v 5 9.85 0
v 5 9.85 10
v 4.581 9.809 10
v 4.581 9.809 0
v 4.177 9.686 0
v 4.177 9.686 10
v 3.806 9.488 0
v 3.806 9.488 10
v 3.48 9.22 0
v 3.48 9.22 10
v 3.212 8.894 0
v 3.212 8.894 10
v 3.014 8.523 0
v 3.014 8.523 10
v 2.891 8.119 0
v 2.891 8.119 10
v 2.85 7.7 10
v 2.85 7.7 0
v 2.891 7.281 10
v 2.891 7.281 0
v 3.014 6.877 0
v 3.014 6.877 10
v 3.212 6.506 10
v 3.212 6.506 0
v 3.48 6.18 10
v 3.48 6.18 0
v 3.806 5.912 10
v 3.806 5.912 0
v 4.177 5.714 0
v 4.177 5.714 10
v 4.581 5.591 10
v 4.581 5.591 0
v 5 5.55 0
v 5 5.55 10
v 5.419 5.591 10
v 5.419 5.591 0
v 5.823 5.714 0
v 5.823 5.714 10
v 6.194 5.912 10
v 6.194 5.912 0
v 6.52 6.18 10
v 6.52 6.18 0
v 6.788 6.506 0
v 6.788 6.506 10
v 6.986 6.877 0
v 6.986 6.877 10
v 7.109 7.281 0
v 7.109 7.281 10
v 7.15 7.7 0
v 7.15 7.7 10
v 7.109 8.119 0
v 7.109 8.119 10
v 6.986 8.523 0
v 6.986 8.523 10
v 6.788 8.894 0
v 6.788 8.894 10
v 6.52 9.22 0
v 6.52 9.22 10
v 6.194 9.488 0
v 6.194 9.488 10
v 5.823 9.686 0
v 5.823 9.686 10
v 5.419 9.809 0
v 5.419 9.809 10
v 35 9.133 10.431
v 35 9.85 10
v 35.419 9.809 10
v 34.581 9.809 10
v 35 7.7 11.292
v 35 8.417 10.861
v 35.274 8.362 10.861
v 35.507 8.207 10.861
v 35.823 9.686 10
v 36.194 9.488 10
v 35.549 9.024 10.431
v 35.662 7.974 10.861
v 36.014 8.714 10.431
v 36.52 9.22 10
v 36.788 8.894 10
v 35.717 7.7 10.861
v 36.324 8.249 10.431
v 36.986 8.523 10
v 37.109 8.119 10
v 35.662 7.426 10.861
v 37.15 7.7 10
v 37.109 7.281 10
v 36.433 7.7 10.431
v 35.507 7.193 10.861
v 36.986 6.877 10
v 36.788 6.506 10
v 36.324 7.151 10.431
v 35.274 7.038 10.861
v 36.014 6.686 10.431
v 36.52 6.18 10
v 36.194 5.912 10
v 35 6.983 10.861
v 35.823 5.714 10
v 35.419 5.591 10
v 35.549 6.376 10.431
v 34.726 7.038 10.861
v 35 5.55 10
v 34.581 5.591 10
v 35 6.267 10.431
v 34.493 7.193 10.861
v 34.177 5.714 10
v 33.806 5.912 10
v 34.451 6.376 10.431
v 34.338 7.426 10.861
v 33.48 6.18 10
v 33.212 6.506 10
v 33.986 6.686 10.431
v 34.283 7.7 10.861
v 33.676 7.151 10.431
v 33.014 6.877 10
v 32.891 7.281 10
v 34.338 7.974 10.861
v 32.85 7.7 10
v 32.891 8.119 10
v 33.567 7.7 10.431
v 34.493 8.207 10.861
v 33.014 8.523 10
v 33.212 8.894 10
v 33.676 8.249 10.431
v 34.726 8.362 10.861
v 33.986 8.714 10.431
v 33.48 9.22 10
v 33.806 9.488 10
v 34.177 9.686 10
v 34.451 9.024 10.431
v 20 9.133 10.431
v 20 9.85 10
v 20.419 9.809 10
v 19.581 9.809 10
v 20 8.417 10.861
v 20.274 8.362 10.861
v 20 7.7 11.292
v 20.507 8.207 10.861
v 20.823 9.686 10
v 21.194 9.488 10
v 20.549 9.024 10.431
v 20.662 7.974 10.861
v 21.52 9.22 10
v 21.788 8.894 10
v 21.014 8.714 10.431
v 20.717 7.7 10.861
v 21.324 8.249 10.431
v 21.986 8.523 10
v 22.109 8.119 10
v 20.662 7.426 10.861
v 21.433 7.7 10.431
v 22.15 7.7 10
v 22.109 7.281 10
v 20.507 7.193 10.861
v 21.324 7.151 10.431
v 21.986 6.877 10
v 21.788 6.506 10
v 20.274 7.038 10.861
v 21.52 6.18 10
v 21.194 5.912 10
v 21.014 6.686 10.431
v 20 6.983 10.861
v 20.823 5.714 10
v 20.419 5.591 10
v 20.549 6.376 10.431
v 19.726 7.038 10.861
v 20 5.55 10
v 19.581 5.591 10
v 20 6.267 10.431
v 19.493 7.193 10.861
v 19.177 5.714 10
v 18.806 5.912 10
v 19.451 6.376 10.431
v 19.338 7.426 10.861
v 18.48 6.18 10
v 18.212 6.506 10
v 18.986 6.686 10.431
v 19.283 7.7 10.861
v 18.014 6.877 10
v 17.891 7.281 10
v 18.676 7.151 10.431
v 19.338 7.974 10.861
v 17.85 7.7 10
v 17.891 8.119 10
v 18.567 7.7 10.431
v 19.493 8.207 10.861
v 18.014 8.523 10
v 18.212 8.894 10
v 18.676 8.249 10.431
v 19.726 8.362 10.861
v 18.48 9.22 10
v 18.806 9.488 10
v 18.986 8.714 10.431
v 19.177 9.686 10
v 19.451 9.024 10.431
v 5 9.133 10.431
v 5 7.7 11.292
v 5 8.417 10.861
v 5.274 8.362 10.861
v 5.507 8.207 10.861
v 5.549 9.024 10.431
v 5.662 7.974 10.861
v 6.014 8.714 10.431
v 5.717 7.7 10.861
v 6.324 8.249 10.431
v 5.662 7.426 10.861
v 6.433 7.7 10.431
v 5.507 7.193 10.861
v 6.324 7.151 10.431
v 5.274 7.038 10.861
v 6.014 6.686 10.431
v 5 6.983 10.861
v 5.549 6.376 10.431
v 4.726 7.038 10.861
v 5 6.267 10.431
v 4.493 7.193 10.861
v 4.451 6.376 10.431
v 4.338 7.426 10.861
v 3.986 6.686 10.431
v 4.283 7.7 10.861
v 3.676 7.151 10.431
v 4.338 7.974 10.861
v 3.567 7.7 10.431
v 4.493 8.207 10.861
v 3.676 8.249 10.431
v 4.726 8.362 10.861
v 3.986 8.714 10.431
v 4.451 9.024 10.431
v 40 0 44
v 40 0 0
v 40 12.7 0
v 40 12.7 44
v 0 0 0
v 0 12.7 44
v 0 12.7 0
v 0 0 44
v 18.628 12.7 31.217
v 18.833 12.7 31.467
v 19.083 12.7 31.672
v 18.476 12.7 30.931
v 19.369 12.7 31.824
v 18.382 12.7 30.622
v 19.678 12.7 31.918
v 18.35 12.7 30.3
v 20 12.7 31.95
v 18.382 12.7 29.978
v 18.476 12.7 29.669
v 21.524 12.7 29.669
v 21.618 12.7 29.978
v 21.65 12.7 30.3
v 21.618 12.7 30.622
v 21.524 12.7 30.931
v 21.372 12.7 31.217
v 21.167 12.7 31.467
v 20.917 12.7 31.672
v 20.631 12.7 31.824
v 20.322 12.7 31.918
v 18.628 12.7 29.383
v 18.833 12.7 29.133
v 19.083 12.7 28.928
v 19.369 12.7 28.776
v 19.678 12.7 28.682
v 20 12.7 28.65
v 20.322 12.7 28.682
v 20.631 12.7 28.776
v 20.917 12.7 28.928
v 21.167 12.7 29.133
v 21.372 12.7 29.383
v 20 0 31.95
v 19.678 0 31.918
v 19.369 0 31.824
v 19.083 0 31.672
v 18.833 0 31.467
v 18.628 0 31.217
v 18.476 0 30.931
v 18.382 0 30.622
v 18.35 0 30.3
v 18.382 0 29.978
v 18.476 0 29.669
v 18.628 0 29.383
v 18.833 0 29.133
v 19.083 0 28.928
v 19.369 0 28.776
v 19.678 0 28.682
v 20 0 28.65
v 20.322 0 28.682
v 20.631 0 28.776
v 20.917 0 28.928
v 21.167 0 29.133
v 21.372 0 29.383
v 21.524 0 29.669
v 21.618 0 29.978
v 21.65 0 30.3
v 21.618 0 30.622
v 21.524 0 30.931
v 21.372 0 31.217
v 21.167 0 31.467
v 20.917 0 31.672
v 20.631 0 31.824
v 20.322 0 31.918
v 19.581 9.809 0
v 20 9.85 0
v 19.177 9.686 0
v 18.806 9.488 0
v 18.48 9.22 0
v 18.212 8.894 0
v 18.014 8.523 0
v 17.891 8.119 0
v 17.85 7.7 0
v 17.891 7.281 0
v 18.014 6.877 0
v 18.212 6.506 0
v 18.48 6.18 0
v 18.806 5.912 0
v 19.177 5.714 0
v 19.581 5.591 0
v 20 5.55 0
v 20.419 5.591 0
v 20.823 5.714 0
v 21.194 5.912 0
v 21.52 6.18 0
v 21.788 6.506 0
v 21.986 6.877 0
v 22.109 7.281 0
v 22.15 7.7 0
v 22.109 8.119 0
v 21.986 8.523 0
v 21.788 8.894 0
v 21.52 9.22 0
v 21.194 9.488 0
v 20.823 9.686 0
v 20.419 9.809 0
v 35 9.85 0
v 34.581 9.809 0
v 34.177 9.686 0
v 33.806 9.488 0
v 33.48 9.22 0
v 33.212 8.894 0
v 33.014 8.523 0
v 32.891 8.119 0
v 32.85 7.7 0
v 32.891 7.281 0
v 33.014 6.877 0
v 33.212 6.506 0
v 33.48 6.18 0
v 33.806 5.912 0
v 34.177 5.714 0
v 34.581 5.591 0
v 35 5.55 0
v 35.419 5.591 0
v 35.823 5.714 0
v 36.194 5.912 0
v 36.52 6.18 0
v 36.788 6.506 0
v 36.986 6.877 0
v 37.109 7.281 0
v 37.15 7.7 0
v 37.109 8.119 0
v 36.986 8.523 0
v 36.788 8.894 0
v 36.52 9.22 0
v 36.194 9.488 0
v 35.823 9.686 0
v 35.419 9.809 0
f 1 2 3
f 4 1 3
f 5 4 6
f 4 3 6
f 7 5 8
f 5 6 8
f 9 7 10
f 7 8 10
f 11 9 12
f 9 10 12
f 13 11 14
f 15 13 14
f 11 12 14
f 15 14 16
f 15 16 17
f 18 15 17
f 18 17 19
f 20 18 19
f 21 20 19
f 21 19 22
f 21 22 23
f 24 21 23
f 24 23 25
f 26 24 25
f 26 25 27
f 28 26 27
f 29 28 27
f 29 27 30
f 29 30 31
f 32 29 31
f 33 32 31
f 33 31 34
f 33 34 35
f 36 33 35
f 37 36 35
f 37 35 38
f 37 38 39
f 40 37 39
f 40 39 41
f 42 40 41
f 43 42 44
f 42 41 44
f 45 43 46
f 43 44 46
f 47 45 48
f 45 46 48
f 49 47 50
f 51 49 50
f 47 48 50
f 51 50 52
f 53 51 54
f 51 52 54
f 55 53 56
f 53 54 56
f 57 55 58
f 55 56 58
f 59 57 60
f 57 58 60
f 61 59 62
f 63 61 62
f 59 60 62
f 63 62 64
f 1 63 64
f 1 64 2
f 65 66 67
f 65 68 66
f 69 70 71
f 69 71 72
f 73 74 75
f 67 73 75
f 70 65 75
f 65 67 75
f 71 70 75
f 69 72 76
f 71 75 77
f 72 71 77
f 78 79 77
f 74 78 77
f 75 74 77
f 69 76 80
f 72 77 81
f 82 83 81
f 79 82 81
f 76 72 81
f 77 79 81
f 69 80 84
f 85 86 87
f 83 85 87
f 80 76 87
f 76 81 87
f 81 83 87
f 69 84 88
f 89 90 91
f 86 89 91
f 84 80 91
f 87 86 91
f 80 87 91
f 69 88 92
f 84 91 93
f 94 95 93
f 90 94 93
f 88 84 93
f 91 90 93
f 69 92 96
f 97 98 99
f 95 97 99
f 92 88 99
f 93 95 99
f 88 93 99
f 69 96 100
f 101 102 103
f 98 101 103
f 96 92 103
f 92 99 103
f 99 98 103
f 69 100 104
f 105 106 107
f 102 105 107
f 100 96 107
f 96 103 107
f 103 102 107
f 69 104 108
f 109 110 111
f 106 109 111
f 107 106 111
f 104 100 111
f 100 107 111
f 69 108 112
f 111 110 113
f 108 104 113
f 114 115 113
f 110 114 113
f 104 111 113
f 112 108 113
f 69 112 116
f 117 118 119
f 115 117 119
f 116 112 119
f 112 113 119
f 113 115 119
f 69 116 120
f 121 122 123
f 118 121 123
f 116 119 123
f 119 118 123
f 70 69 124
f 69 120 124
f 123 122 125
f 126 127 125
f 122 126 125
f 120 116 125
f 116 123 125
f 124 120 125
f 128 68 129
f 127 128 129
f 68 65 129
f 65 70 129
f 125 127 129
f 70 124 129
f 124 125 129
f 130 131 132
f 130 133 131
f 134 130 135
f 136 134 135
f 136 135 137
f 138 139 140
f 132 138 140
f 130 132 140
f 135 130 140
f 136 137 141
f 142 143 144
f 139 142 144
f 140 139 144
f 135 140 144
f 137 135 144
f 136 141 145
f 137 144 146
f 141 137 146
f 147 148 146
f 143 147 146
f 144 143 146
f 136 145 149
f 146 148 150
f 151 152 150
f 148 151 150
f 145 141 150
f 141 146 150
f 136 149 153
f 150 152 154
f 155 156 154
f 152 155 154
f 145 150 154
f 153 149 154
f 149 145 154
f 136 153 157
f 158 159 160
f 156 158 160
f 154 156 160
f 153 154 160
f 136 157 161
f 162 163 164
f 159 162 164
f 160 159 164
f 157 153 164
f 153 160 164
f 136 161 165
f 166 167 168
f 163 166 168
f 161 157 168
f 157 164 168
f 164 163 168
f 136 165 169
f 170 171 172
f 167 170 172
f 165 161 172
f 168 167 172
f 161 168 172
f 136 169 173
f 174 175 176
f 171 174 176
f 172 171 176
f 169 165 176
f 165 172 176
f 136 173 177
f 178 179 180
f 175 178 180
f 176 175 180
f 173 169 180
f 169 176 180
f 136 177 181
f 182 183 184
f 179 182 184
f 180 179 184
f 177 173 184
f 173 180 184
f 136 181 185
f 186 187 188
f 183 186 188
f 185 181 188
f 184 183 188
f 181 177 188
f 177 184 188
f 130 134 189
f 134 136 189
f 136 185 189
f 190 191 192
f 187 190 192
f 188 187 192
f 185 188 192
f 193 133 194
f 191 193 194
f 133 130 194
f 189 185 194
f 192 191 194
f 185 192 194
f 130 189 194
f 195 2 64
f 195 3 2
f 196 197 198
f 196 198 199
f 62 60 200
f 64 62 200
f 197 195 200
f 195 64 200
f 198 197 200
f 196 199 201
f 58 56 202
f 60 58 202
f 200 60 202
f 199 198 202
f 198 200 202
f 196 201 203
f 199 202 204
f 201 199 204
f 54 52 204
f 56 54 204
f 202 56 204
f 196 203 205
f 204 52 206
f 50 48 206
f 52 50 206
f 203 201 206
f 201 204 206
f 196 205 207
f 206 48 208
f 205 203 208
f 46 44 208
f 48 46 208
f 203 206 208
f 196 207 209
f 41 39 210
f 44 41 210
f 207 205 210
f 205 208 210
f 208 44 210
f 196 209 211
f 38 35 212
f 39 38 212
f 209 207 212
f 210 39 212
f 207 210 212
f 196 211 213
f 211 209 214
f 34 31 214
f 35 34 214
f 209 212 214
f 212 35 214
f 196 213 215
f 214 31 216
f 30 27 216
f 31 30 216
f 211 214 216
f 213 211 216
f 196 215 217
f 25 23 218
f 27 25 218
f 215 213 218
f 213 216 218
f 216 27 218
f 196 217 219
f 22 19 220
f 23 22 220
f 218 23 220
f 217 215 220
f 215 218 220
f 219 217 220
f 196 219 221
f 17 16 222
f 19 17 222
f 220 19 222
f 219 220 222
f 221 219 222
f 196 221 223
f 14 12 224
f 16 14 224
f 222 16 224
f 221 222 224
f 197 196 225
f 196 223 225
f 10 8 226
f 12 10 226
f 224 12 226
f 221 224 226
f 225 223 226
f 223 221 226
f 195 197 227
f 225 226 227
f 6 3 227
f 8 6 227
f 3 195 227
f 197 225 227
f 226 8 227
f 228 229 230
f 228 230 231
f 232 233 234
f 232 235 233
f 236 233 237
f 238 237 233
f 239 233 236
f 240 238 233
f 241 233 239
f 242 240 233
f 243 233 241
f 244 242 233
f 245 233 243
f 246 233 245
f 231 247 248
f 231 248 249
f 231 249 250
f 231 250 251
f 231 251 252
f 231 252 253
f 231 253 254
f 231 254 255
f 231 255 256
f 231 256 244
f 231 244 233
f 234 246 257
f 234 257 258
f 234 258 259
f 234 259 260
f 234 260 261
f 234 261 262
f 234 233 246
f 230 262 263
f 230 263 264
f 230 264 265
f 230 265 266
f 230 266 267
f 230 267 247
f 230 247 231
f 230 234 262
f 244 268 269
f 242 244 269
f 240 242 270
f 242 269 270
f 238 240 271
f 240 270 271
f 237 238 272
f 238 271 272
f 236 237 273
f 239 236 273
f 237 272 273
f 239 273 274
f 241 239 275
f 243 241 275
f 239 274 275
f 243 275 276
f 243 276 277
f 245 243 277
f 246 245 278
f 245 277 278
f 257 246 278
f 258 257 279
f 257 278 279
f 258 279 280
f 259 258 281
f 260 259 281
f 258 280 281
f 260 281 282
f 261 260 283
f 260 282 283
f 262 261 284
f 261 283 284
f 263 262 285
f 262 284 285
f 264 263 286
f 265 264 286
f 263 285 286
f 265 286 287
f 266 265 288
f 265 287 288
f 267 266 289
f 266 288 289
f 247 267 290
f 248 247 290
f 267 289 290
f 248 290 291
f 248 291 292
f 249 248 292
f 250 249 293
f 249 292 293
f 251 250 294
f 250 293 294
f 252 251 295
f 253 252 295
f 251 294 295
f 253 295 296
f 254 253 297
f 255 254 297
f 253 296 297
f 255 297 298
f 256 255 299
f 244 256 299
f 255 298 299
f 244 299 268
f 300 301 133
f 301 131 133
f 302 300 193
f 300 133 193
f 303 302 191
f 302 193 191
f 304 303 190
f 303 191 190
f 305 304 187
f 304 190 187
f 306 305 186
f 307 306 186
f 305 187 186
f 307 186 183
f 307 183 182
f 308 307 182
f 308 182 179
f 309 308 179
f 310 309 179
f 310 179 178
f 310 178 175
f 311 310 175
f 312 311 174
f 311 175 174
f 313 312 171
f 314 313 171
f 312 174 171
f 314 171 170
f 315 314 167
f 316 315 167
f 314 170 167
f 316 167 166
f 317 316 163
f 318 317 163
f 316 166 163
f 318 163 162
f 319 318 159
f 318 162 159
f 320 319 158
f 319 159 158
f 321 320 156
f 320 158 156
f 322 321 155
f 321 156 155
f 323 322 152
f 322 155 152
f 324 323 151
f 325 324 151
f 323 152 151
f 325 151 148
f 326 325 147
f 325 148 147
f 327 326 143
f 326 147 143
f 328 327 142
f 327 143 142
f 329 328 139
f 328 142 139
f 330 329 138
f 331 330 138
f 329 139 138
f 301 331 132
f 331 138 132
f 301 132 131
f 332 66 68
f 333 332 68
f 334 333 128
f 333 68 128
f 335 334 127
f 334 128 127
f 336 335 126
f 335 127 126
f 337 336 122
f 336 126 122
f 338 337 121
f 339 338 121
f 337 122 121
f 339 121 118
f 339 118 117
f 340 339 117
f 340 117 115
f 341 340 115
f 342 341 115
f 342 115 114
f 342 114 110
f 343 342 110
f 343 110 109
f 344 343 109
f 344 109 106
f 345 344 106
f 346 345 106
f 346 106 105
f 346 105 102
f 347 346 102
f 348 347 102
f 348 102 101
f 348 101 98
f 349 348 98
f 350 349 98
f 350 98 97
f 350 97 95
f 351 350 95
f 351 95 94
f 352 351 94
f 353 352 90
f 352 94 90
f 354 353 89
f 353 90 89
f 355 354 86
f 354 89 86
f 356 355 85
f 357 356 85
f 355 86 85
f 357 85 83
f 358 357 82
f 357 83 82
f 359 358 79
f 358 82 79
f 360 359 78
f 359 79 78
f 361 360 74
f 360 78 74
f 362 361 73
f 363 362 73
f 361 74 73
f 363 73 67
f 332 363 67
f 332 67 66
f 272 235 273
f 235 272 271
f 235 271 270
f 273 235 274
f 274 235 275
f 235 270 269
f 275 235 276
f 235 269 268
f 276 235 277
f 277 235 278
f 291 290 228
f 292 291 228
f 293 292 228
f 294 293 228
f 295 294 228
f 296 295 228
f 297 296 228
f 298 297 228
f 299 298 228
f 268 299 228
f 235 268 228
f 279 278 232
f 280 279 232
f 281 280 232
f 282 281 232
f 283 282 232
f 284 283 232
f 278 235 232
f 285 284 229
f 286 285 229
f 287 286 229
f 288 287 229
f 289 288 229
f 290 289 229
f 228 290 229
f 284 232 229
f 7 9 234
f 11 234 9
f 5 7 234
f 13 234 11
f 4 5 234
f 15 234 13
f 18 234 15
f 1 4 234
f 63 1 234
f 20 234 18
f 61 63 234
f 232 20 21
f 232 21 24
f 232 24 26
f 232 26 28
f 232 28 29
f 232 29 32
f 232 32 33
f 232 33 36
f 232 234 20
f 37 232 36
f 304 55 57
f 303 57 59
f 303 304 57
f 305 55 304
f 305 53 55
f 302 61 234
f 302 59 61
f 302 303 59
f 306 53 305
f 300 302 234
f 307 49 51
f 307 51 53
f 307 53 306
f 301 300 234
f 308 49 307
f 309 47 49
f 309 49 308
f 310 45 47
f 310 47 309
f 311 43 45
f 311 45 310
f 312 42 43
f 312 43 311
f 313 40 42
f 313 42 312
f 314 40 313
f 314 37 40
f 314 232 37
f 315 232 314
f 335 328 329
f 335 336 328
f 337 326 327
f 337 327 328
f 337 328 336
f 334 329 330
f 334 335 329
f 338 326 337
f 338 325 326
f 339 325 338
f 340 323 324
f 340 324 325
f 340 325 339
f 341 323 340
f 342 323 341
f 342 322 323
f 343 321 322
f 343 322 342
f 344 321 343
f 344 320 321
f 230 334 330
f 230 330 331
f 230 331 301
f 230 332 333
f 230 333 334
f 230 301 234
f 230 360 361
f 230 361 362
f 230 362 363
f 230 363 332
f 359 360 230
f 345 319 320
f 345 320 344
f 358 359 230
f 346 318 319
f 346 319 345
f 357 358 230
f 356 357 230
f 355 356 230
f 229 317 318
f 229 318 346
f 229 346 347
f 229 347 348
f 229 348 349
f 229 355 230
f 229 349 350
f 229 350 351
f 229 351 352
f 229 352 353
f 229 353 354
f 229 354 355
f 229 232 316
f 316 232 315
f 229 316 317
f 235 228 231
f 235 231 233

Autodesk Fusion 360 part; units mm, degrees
sketch "Sketch1" plane through (0, 0, 0) normal (0, 1, 0) x (1, 0, 0)
  line L0 (0, 0) -> (40, 0)
  line L1 (40, 0) -> (40, -44)
  line L2 (40, -44) -> (0, -44)
  line L3 (0, -44) -> (0, 0)
  dimension "d1" = 40
  dimension "d2" = 44
extrude "Extrude1" add sketch "Sketch1" along normal blind 12.7
sketch "Sketch2" plane through (0, 12.7, 0) normal (0, 1, 0) x (-1, 0, 0)
  line L0 (0, 44) -> (-40, 44)
  line L1 (-40, 44) -> (-40, 0)
  line L2 (-40, 0) -> (0, 0)
  line L3 (0, 0) -> (0, 44)
  line L4 (0, 30.3) -> (-40, 30.3) construction
  point P0 (-20, 30.3)
  dimension "d38" = 30.3
hole "Hole8" at (20, 12.7, 30.3) direction (0, -1, 0) diameter 3.3 end through all
sketch "Sketch4" plane through (0, 0, 0) normal (0, 0, -1) x (-1, 0, 0)
  line L0 (-40, 0) -> (0, 0)
  line L1 (0, 0) -> (0, 12.7)
  line L2 (0, 12.7) -> (-40, 12.7)
  line L3 (-40, 12.7) -> (-40, 0)
  line L4 (-40, 7.7) -> (0, 7.7) construction
  line L5 (-20, 12.7) -> (-20, 0) construction
  point P0 (-35, 7.7)
  point P1 (-5, 7.7)
  point P2 (-20, 7.7)
  dimension "d39" = 5
  dimension "d40" = 15
  dimension "d41" = 15
hole "Hole9" at (35, 7.7, 0) direction (0, 0, 1) diameter 4.3 depth 10 tip angle 118
hole "Hole10" at (5, 7.7, 0) direction (0, 0, 1) diameter 4.3 depth 10 tip angle 118
hole "Hole11" at (20, 7.7, 0) direction (0, 0, 1) diameter 4.3 depth 10 tip angle 118
